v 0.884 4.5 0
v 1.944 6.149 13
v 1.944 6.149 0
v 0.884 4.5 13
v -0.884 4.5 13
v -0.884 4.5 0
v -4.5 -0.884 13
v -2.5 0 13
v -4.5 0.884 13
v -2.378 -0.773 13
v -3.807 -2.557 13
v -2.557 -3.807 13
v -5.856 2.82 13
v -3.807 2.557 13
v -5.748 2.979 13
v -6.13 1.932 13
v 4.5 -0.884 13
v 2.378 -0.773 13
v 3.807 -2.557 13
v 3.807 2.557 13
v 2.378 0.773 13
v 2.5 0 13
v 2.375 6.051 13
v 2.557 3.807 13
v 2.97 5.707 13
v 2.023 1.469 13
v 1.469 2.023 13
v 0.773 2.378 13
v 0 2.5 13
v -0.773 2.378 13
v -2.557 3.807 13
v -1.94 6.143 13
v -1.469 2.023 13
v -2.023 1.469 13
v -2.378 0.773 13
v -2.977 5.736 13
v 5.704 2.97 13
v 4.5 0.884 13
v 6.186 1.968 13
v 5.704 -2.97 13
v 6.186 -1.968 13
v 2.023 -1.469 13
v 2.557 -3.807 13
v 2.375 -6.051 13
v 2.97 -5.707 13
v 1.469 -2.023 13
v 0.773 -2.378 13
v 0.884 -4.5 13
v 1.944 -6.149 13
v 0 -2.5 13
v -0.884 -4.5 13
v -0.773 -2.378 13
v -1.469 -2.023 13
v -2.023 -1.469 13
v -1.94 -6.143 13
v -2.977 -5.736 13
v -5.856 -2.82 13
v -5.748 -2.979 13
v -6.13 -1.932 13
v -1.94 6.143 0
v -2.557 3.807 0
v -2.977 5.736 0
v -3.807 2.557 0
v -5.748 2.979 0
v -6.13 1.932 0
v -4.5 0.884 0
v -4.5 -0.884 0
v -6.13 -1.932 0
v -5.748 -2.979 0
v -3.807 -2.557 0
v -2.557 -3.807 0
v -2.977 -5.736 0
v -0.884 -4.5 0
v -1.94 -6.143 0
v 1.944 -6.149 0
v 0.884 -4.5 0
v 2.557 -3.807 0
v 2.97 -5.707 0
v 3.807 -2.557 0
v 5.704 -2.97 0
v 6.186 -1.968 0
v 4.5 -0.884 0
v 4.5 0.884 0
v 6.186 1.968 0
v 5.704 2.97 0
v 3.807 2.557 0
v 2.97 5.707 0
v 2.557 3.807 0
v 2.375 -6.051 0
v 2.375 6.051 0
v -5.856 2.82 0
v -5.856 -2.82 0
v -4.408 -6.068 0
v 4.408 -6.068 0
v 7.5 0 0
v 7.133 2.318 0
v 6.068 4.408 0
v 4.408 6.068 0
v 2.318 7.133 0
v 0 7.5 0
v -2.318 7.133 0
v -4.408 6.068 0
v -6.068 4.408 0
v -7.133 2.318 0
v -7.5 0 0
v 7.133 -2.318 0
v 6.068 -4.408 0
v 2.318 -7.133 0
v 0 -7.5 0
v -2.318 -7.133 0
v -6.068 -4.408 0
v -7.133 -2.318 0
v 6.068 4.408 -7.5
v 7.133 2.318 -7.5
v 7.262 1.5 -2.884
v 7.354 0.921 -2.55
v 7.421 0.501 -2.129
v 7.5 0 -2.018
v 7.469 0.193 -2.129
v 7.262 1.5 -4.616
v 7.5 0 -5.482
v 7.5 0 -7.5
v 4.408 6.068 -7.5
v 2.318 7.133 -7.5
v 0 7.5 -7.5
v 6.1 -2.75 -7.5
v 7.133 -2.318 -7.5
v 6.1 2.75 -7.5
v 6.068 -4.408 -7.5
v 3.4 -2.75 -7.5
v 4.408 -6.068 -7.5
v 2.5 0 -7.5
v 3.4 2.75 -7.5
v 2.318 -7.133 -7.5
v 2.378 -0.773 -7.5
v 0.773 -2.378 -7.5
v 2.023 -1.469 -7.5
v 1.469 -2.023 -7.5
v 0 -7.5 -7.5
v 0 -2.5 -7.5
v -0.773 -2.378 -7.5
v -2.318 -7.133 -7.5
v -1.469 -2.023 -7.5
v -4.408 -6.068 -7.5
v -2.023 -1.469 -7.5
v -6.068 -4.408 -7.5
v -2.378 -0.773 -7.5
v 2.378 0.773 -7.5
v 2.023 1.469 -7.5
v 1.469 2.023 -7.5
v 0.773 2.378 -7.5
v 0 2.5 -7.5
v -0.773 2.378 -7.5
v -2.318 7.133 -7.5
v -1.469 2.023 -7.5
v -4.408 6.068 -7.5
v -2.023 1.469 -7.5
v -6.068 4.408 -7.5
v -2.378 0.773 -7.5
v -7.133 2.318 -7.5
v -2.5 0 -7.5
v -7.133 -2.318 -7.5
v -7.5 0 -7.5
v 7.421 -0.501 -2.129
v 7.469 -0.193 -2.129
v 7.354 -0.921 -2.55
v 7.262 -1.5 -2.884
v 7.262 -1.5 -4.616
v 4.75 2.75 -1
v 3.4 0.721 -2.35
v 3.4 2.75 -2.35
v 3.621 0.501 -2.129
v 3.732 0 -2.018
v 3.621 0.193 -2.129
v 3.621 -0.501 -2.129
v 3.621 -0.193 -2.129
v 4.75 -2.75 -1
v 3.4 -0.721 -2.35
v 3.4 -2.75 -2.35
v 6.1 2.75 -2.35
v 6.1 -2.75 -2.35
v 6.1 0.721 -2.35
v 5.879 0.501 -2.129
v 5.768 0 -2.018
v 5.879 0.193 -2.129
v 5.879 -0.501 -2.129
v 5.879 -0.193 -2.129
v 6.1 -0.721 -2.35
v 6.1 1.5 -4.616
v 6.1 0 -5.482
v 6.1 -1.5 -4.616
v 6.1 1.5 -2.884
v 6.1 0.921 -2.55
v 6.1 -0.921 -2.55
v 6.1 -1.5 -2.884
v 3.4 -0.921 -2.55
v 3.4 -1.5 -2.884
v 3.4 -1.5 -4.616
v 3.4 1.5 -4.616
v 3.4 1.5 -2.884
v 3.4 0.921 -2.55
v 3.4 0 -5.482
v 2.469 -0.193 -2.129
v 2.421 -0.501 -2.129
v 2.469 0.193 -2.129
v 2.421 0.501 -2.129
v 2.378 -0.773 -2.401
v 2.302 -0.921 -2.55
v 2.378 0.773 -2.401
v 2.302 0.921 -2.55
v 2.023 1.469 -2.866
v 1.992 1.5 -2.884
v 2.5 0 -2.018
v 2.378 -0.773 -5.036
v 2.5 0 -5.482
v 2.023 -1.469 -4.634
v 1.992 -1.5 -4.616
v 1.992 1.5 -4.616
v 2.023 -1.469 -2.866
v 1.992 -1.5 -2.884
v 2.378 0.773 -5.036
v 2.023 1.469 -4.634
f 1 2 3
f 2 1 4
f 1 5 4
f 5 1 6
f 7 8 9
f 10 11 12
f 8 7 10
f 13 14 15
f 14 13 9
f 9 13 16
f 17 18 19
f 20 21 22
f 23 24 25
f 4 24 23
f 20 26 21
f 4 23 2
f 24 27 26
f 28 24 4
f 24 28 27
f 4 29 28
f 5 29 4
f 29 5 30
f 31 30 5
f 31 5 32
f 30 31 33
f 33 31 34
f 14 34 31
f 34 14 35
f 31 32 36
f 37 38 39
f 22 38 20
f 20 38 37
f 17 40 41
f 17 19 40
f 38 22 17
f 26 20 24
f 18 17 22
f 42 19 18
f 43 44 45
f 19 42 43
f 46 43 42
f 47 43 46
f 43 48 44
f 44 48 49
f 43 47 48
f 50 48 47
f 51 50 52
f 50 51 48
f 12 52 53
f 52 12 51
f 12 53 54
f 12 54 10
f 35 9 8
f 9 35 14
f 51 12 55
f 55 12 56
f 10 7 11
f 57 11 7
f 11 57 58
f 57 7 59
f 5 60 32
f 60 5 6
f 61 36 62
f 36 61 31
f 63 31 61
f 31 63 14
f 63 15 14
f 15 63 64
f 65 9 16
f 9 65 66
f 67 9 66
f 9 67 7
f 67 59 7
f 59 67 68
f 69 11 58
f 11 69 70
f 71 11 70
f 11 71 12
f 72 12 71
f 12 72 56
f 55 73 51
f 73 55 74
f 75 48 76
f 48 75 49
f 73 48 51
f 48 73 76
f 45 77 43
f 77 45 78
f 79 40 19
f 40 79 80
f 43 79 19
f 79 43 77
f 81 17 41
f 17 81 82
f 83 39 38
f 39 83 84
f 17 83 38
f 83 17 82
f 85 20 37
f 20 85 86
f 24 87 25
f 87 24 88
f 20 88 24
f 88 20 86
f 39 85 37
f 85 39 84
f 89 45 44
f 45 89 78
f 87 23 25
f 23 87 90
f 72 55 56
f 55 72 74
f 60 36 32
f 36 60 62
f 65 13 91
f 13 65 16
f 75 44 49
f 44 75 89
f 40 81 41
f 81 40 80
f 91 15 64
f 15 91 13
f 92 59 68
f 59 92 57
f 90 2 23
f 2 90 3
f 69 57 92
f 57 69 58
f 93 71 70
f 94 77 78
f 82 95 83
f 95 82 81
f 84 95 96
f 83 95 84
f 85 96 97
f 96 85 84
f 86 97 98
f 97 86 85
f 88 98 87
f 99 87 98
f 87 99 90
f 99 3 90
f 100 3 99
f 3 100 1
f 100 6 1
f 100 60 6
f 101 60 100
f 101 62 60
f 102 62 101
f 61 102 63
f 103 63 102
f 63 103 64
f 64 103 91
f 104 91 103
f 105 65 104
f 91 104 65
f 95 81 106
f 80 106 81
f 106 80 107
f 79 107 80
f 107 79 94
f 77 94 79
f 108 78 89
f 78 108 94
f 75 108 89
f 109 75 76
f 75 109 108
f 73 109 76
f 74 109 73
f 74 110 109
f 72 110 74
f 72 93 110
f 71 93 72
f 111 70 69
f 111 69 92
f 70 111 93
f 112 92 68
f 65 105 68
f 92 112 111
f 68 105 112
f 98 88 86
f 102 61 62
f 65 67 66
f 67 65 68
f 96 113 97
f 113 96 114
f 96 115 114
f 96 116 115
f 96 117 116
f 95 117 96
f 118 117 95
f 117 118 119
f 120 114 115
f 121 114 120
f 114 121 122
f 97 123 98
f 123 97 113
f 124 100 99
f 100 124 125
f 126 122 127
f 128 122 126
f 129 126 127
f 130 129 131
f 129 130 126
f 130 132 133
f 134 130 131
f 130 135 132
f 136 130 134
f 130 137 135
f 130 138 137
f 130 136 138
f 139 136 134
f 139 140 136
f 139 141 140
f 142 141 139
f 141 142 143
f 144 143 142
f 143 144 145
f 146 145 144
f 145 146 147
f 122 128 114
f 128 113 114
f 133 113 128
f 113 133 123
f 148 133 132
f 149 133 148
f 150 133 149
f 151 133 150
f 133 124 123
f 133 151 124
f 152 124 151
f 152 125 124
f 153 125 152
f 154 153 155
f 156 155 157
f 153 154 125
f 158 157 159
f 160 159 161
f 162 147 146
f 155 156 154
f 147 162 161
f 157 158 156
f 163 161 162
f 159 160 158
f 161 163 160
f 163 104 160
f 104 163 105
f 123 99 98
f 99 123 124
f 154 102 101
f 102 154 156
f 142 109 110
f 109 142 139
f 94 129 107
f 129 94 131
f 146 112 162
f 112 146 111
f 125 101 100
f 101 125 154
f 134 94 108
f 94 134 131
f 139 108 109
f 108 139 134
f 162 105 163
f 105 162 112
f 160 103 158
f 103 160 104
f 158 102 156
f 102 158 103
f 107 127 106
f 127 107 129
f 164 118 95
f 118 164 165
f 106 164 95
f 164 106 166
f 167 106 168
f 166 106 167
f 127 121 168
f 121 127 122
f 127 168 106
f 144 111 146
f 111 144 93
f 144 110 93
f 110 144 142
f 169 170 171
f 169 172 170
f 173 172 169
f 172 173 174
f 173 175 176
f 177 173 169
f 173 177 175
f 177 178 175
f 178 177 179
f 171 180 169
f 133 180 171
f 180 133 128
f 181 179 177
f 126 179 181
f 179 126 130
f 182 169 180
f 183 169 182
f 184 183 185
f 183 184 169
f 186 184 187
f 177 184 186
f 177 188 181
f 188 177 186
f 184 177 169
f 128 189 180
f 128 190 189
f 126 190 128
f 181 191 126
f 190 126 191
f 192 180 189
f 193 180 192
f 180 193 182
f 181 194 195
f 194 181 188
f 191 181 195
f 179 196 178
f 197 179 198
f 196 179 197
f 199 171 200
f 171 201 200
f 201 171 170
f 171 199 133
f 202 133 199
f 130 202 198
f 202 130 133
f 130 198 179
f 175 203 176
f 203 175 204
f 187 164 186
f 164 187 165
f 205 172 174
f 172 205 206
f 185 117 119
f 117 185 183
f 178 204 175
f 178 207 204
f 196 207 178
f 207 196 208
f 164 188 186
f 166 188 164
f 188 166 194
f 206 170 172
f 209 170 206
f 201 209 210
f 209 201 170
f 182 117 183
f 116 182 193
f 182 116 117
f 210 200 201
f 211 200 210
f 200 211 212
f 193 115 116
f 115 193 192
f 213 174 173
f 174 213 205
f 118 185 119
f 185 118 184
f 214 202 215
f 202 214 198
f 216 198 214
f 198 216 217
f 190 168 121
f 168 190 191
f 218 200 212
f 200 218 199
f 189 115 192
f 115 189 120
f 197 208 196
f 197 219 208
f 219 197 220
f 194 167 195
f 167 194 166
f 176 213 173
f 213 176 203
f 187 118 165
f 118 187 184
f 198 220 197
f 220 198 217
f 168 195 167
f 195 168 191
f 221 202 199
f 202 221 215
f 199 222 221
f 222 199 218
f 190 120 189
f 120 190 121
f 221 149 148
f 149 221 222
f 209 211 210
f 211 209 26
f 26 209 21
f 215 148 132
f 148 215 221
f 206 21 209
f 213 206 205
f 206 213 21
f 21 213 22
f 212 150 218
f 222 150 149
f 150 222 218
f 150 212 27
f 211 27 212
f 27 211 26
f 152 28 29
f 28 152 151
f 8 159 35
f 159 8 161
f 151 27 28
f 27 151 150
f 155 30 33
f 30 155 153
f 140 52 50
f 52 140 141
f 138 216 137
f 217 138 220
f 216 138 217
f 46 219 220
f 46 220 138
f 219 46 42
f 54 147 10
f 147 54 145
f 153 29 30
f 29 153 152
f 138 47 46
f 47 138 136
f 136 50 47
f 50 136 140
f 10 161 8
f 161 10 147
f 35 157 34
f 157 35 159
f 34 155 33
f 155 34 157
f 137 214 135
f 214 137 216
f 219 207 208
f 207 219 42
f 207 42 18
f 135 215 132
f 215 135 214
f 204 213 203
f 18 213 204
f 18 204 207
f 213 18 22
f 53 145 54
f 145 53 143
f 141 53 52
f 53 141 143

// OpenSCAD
// file: parameters.scad
// Parameters file for RepRap Huxley

pi=3.14159265;

// The relative location in your file system where the .dxf files are
// DXFs are for quick development.  They should be replaced by parameterised CSG in dure course.

fileroot="DXF-files/";

rodsize = 6;	//threaded/smooth rod diameter in mm
xaxis = 182.5;	//width of base in mm
yaxis = 266.5;	//length of base in mm


screwsize = 3;	//bearing bore/screw diameter in mm
bearingsize = 10;	//outer diameter of bearings in mm
bearingwidth = 4;	//width of bearings in mm


rodpitch = rodsize / 6;
rodnutsize = 0.8 * rodsize; //4.8
rodwashersize = 0.2 * rodsize; //1.2
rodwasherdiameter = 2 * rodsize;//12
screwpitch = screwsize / 6;
nutsize = 0.8 * screwsize;
nutdiameter = 1.9 * screwsize;
washersize = 0.2 * screwsize;
washerdiameter = 2 * screwsize;
partthick = 2 * (rodsize+1); //12
vertexrodspace = 2 * rodsize; //12


c = [0.3, 0.3, 0.3];
rodendoffset = rodnutsize + rodwashersize * 2 + partthick / 2;//13.2
vertexoffset = vertexrodspace + rodendoffset;//25.2
//vertexoffset = 22;

renderrodthreads = false;
renderscrewthreads = false;
fn = 36;

// The gap between the joining rods at a vertex

vertex_radius=sqrt(rodsize*rodsize + vertexoffset*vertexoffset);
vertex_ang = atan(vertexoffset/rodsize)-30;
vertex_gap = 2*vertex_radius*cos(vertex_ang);

// Nema 14 dimensions - these are absolute

nema14_square=35.3;
nema14_screws=26;
nema14_screw_r=1.5;
nema14_hub=22;
nema14_hub_depth=2;
nema14_length=36;
nema14_shaft=5;
nema14_shaft_length=66;
nema14_shaft_projection=19;

// Nema 11 dimensions - these are absolute

nema11_square=28.5;
nema11_screws=23;
nema11_screw_r=1.25;
nema11_hub=22;
nema11_hub_depth=2;
nema11_length=44.5;
nema11_shaft=5;
nema11_shaft_length=78;
nema11_shaft_projection=18;

// Limit switch parameters

limit_switch_hole_diameter=2.5;
limit_switch_centres=9.5;

// The RepRap slide bearings

bearing_mount_centres=18;
bearing_width=7;

// X axis parameters - many should be relative

x_bar_gap=30;
motor_center_y = 26;
bar_clamp_x=5;
bar_clamp_y=8;
bar_clamp_x_gap=23;
bearing_y=50;
bearing_x=bar_clamp_x_gap + 10;
hole_land=4;
thickness=5;
bearing_low_z = 8;
bearing_z_gap = 25;
bearing_plate_width = bearing_mount_centres+2*hole_land + 10;
bearing_plate_overlap=0.5;
bearing_plate_support=10;
// main file
include <parameters.scad>;


// inner and outer product.  Why aren't these standard?!!!?

function ip(v1 = [0,0,0], v2 = [0,0,0]) = v1.x*v2.x + v1.y*v2.y + v1.z*v2.z;

function op(v1 = [0,0,0], v2 = [0,0,0]) = [v1.y*v2.z - v1.z*v2.y, v1.z*v2.x - v1.x*v2.z, v1.x*v2.y - v1.y*v2.x];


// Adjustable slide bearings for 6mm diameter rods mounted using M3 cap screws 18 mm apart.

// The profile for these should be CSG from the parameters, but at the moment it's a dxf.

// Adrian Bowyer 18 December 2010

//*****************************************************************************************************************

// Make an extrusion from the appropriate profile

module bearingProfile(b360=true)
{
	if(b360)
		linear_extrude(file = str(fileroot, "bearing360.dxf"), layer = "0", height = bearing_width, 
			center = true, convexity = 10, twist = 0, $fn=40);
	else
		linear_extrude(file = str(fileroot, "bearing180.dxf"), layer = "0", height = bearing_width, 
			center = true, convexity = 10, twist = 0, $fn=40);
}

// The distance between the 3mm screw centres is 18 mm
// Set mounts true to get mounting holes, false to get the bearing
// Set b360 true for a 360 degree bearing, false for a 180 one.

module adjustable_bearing(b360, mounts=false)
{
	translate([-13,-9,0]) // Centre the shaft on the z axis
	{
		if(mounts)
		{
			union()
			{
				translate([4, -10, 0])rotate(90, [0, 1, 0])
					rotate(-90, [1, 0, 0])
						cylinder(r=1.5, h=50, centre = true, $fn=10);
				translate([22, -10, 0])rotate(90, [0, 1, 0])
					rotate(-90, [1, 0, 0])
						cylinder(r=1.5, h=50, centre = true, $fn=10);
			}
		}else
		{
			difference()
			{
		  		bearingProfile(b360);
				translate([4, -10, 0])rotate(90, [0, 1, 0])
					rotate(-90, [1, 0, 0])
						teardrop(r=1.5, h=50, truncateMM=-1);
				translate([22, -10, 0])rotate(90, [0, 1, 0])
					rotate(-90, [1, 0, 0])
						teardrop(r=1.5, h=50, truncateMM=-1);
			}
		}
	}
}




/*
  This makes an angled strut in space between two points.  It is parallel to one of the
  coordinate planes, which means that one coordinate of the two endpoints must be the same.
*/

module strut_block(da, db, wide, deep, round=1)
{
	union()
	{
		translate([-wide/2,-deep/2,0])
			cube([wide, deep, sqrt(da*da + db*db)]);
		if(round == 1)
		{
			rotate([90,0,0])
					cylinder(r=wide/2, h=deep,center=true,$fn=20);
			translate([0,0,sqrt(da*da + db*db)])
				rotate([90,0,0])
					cylinder(r=wide/2, h=deep,center=true,$fn=20);
		} else if(round == 2)
		{
			rotate([0,90,0])
					cylinder(r=deep/2, h=wide,center=true,$fn=20);
			translate([0,0,sqrt(da*da + db*db)])
				rotate([0,90,0])
					cylinder(r=deep/2, h=wide,center=true,$fn=20);
		}
	}
}

module strut(p1=[0,0,0], p2=[0,0,1], wide = 10, deep = 5, round=1)
{
	if(abs(p1.x - p2.x) < 0.00001)
	{
		translate(p1)
			rotate([atan2(p2.z - p1.z, p2.y - p1.y), 0, 0])
				rotate([-90,0,0])
					rotate([0,0,90])
						strut_block(p2.y - p1.y, p2.z - p1.z, wide, deep, round);
	} else if(abs(p1.y - p2.y) < 0.00001)
	{
		translate(p1)
			rotate([0,atan2( p2.x - p1.x, p2.z - p1.z), 0])
					strut_block(p2.x - p1.x, p2.z - p1.z, wide, deep);
	} else
	{
		translate(p1)
			rotate([0,0,atan2(p2.y - p1.y, p2.x - p1.x)])
				rotate([0,90,0])
					strut_block(p2.x - p1.x, p2.y - p1.y, wide, deep, round);
	}
}


/*
  This gives either a NEMA 14 stepper motor or its mounting holes.

  If body is true, you get the motor.  If it is false you get the screw holes and central
  hole needed to mount the motor.  If counterbore is positive and you are generating the mounting holes
  then the screw holes will get fat to accomodate a cap-screw head counterbore mm away from the face 
  of the motor.  For no counterbores, set counterbore negative.

*/

module nema14(body = true, counterbore = -1)
{
	color([1,0.4,0.4,1])
	union()
	{
		if(body)
		{
			translate([0, 0, nema14_shaft_length/2 - nema14_shaft_projection - nema14_hub_depth])
				cylinder(r = nema14_shaft/2, h = nema14_shaft_length, center = true, $fn=20);
			translate([0, 0, -nema14_hub_depth])
				cylinder(r = nema14_hub/2, h = nema14_hub_depth*2, center = true, $fn=20);
	
			translate([0, 0, nema14_length/2])
				cube([nema14_square,nema14_square,nema14_length], center = true);
		} else
			translate([0, 0, -20])
				cylinder(r = nema14_hub/2 + 1, h = 50, center = true, $fn=20);

		if(!body)
		{
			union()
			{
				for ( x = [0:1] ) 
				for ( y = [0:1] )
				{
					translate([(x-0.5)*nema14_screws, (y-0.5)*nema14_screws, -20])
						cylinder(r = nema14_screw_r, h = 50, center = true, $fn=10);
					if(counterbore >= 0)
						translate([(x-0.5)*nema14_screws, (y-0.5)*nema14_screws, -25-counterbore])
							cylinder(r = 2*nema14_screw_r, h = 50, center = true, $fn=10);
				}
			}
		}
	}
}

module nema11(body = true, counterbore = -1)
{
	color([1,0.4,0.4,1])
	union()
	{
		if(body)
		{
			translate([0, 0, nema11_shaft_length/2 - nema11_shaft_projection - nema11_hub_depth])
				cylinder(r = nema11_shaft/2, h = nema11_shaft_length, center = true, $fn=20);
			translate([0, 0, -nema11_hub_depth])
				cylinder(r = nema11_hub/2, h = nema11_hub_depth*2, center = true, $fn=20);
	
			translate([0, 0, nema11_length/2])
				cube([nema11_square,nema11_square,nema11_length], center = true);
		} else
			translate([0, 0, -20])
				cylinder(r = nema11_hub/2 + 1, h = 50, center = true, $fn=20);

		if(!body)
		{
			union()
			{
				for ( x = [0:1] ) 
				for ( y = [0:1] )
				{
					translate([(x-0.5)*nema11_screws, (y-0.5)*nema11_screws, -20])
						cylinder(r = nema11_screw_r, h = 50, center = true, $fn=10);
					if(counterbore >= 0)
						translate([(x-0.5)*nema11_screws, (y-0.5)*nema11_screws, -25-counterbore])
							cylinder(r = 2*nema11_screw_r, h = 50, center = true, $fn=10);
				}
			}
		}
	}
}


// Pentagon nut that matches a hexagon...

module pentanut(height=40)
{
	rotate([0,0,60])
	intersection()
	{
		translate([-nutsize,-nutsize*5,-20])
			cube([nutsize*10, nutsize*10,height]);
		rotate([0,0,60])
			translate([-nutsize,-nutsize*5,-20])
				cube([nutsize*10, nutsize*10,height]);
		rotate([0,0,120])
			translate([-nutsize,-nutsize*5,-20])
				cube([nutsize*10, nutsize*10,height]);
		rotate([0,0,180])
			translate([-nutsize,-nutsize*5,-20])
				cube([nutsize*10, nutsize*10,height]);
		rotate([0,0,240])
			translate([-nutsize,-nutsize*5,-20])
				cube([nutsize*10, nutsize*10,height]);
	}
}


// Make a RepRap teardrop with its axis along Z
// If truncated is true, chop the apex; if not, come to a point

// I stole this function from Erik...


module teardrop(r=1.5, h=20, a=0, truncateMM=0.5)
{
	rotate([0,0,a]) union()
	{
		if(truncateMM > 0)
		{
			translate([0,0,0]) intersection()
			{
				translate([truncateMM,0,h/2]) 
					scale([1,1,h])
						cube([r*2.8275,r*2,1],center=true);
				scale([1,1,h]) 
						rotate([0,0,3*45])
							cube([r,r,1]);
			}
		} else
		{
			scale([1,1,h])
				rotate([0,0,3*45])
					cube([r,r,1]);
		}
		//cylinder(r=r, h = h, $fn=20);
		polyhole(h,r*2);
	}
}


// Make a ball-bearing holder cutout

module bearing_holder(radius = 6.5)
{
	union()
	{
		cylinder (h = radius*20, r = radius, center = true, $fn = 20);
		for(i=[0:2])
		{
			rotate([0,0,120*i])
				translate([radius+screwsize/2, 0, 0])
					union()
					{
						cylinder (h = radius*20, r = screwsize/2, center = true, $fn = 20);
						translate([-screwsize, 0, 0])
							cube([2*screwsize, screwsize, radius*20], center = true);
					}
		}
	}
}

// Make a cuboid with a 45 degree top for vertical slots etc

module cen_hat(size)
{
	translate([0, 0, size.x/sqrt(2)])
		union()
		{
			rotate([0, 45, 0])
				cube([size.x, size.y, 5*max(size.x, max(size.y, size.z))], center=true);
			rotate([0, -45, 0])
				cube([size.x, size.y, 5*max(size.x, max(size.y, size.z))], center=true);
		}
}

module hat_cube(size = [1,1,1], center = false)
{
	difference()
	{
		cube(size, center);
		if(center)
			translate([0, 0, size.z/2])
				cen_hat(size);
		else
			translate([size.x/2, size.y/2, size.z])
				cen_hat(size);
	}
}



module rod(length, threaded=false) if (threaded && renderrodthreads) {
	linear_extrude(height = length, center = true, convexity = 10, twist = -360 * length / rodpitch, $fn = fn)
		translate([rodsize * 0.1 / 2, 0, 0])
			circle(r = rodsize * 0.9 / 2, $fn = fn);
} else {
    //cylinder(h = length, r = rodsize / 2, center = true, $fn = fn);
    polyhole(length,rodsize);
}
module roundcorner(diameter){
	difference(){
		cube(size = [diameter,diameter,99], center = false);
		translate(v = [diameter, diameter, 0]) cylinder(h = 100, r=diameter, center=true);
	}
}

module polyhole(h, d) {
    n = max(round(2 * d),3);
    rotate([0,0,180])
        cylinder(h = h, r = (d / 2) / cos (180 / n), $fn = n);
}

module rodnut(position, washer) render() translate([0, 0, position]) {
	intersection() {
		scale([1, 1, 0.5]) sphere(r = 1.05 * rodsize, center = true);
		difference() {
			cylinder (h = rodnutsize, r = rodnutdiameter / 2, center = true, $fn = 6);
			rod(rodnutsize + 0.1);
		}
	}
	if (washer == 1 || washer == 4) rodwasher(((position > 0) ? -1 : 1) * (rodnutsize + rodwashersize) / 2);
	if (washer == 2 || washer == 4) rodwasher(((position > 0) ? 1 : -1) * (rodnutsize + rodwashersize) / 2);
}


module rodwasher(position) render() translate ([0, 0, position]) difference() {
	cylinder(r = rodwasherdiameter / 2, h = rodwashersize, center = true, $fn = fn);
	rod(rodwashersize + 0.1);
}


module screw(length, nutpos, washer, bearingpos = -1) union(){
	translate([0, 0, -length / 2]) if (renderscrewthreads) {
		linear_extrude(height = length, center = true, convexity = 10, twist = -360 * length / screwpitch, $fn = fn)
			translate([screwsize * 0.1 / 2, 0, 0])
				circle(r = screwsize * 0.9 / 2, $fn = fn);
	} else cylinder(h = length, r = screwsize / 2, center = true, $fn = fn);
	render() difference() {
		translate([0, 0, screwsize / 2]) cylinder(h = screwsize, r = screwsize, center = true, $fn = fn);
		translate([0, 0, screwsize]) cylinder(h = screwsize, r = screwsize / 2, center = true, $fn = 6);
	}
	if (washer > 0 && nutpos > 0) {
		washer(nutpos);
		nut(nutpos + washersize);
	} else if (nutpos > 0) nut(nutpos);
	if (bearingpos >= 0) bearing(bearingpos);
}


module bearing(position) render() translate([0, 0, -position - bearingwidth / 2]) union() {
	difference() {
		cylinder(h = bearingwidth, r = bearingsize / 2, center = true, $fn = fn);
		cylinder(h = bearingwidth * 2, r = bearingsize / 2 - 1, center = true, $fn = fn);
	}
	difference() {
		cylinder(h = bearingwidth - 0.5, r = bearingsize / 2 - 0.5, center = true, $fn = fn);
		cylinder(h = bearingwidth * 2, r = screwsize / 2 + 0.5, center = true, $fn = fn);
	}
	difference() {
		cylinder(h = bearingwidth, r = screwsize / 2 + 1, center = true, $fn = fn);
		cylinder(h = bearingwidth + 0.1, r = screwsize / 2, center = true, $fn = fn);
	}
}


module nut(position, washer) render() translate([0, 0, -position - nutsize / 2]) {
	intersection() {
		scale([1, 1, 0.5]) sphere(r = 1.05 * screwsize, center = true);
		difference() {
			cylinder (h = nutsize, r = nutdiameter / 2, center = true, $fn = 6);
			cylinder(r = screwsize / 2, h = nutsize + 0.1, center = true, $fn = fn);
		}
	}
	if (washer > 0) washer(0);
}


module washer(position) render() translate ([0, 0, -position - washersize / 2]) difference() {
	cylinder(r = washerdiameter / 2, h = washersize, center = true, $fn = fn);
	cylinder(r = screwsize / 2, h = washersize + 0.1, center = true, $fn = fn);
}


module tooth_gap(height = 10, number_of_teeth = 11, inner_radius = 10, dr = 3,  angle=7)
{
	linear_extrude(height = 2*height, center = true, convexity = 10, twist = 0)
		polygon( points = [
			[pi*inner_radius/(2*number_of_teeth), 0],
			[-pi*inner_radius/(2*number_of_teeth), 0],
			[-2*dr *sin(angle) - pi*inner_radius/(2*number_of_teeth), 2*dr],
			[2*dr *sin(angle) + pi*inner_radius/(2*number_of_teeth), 2*dr],
		], convexity = 3);
}



module gear(height = 10, number_of_teeth = 11, inner_radius = 10, outer_radius = 12, angle=15)
{
	difference()
	{
		cylinder(h = height, r = outer_radius, centre = true);
		for(i = [0:number_of_teeth])
		{
		rotate([0, 0, i*360/number_of_teeth])
			translate([0, inner_radius, 0])
				tooth_gap(height = height, number_of_teeth = number_of_teeth, inner_radius = inner_radius, 
					dr =  outer_radius - inner_radius,  angle=angle);
		}
	}
}

module grub_gear(base_height=7.5, height =13, number_of_teeth = 8, inner_radius = 4.5, outer_radius = 6.5, angle=40)
{
	difference()
	{
		union()
		{
			translate([0,0,0])
				gear(height =height, number_of_teeth = number_of_teeth, inner_radius = inner_radius, 
					outer_radius = outer_radius, angle=angle);
			translate([0,0,-base_height/2])
				cylinder(h = base_height, r = outer_radius+1,center=true,$fn=20);
		}
		
		cylinder(h = 30, r = 2.5,center=true,$fn=20);
		
		translate([4.75,0,-6])
			hat_cube([2.7,5.5,10], center=true);
		translate([0,0,-3.75])
			rotate([0,90,0])
				teardrop(h = 20, r = 1.5,truncateMM=0.5);
	}
}


grub_gear();

//gear();



//rod(20);
//translate([rodsize * 2.5, 0, 0]) rod(20, true);
//translate([rodsize * 5, 0, 0]) screw(10, true);
//translate([rodsize * 7.5, 0, 0]) bearing();
//translate([rodsize * 10, 0, 0]) rodnut();
//translate([rodsize * 12.5, 0, 0]) rodwasher();
//translate([rodsize * 15, 0, 0]) nut();
//translate([rodsize * 17.5, 0, 0]) washer();

//hat_cube(size=[2,40,2], center=false);

//bearing_holder();

//teardrop();

//pentanut();

//nema14(body = false, counterbore = 8);

//nema11(body = false, counterbore = 8);
//strut(p1=[20,10,20], p2=[20, 60, 40], wide=10, deep=5, round=2);


//adjustable_bearing(true, false);
